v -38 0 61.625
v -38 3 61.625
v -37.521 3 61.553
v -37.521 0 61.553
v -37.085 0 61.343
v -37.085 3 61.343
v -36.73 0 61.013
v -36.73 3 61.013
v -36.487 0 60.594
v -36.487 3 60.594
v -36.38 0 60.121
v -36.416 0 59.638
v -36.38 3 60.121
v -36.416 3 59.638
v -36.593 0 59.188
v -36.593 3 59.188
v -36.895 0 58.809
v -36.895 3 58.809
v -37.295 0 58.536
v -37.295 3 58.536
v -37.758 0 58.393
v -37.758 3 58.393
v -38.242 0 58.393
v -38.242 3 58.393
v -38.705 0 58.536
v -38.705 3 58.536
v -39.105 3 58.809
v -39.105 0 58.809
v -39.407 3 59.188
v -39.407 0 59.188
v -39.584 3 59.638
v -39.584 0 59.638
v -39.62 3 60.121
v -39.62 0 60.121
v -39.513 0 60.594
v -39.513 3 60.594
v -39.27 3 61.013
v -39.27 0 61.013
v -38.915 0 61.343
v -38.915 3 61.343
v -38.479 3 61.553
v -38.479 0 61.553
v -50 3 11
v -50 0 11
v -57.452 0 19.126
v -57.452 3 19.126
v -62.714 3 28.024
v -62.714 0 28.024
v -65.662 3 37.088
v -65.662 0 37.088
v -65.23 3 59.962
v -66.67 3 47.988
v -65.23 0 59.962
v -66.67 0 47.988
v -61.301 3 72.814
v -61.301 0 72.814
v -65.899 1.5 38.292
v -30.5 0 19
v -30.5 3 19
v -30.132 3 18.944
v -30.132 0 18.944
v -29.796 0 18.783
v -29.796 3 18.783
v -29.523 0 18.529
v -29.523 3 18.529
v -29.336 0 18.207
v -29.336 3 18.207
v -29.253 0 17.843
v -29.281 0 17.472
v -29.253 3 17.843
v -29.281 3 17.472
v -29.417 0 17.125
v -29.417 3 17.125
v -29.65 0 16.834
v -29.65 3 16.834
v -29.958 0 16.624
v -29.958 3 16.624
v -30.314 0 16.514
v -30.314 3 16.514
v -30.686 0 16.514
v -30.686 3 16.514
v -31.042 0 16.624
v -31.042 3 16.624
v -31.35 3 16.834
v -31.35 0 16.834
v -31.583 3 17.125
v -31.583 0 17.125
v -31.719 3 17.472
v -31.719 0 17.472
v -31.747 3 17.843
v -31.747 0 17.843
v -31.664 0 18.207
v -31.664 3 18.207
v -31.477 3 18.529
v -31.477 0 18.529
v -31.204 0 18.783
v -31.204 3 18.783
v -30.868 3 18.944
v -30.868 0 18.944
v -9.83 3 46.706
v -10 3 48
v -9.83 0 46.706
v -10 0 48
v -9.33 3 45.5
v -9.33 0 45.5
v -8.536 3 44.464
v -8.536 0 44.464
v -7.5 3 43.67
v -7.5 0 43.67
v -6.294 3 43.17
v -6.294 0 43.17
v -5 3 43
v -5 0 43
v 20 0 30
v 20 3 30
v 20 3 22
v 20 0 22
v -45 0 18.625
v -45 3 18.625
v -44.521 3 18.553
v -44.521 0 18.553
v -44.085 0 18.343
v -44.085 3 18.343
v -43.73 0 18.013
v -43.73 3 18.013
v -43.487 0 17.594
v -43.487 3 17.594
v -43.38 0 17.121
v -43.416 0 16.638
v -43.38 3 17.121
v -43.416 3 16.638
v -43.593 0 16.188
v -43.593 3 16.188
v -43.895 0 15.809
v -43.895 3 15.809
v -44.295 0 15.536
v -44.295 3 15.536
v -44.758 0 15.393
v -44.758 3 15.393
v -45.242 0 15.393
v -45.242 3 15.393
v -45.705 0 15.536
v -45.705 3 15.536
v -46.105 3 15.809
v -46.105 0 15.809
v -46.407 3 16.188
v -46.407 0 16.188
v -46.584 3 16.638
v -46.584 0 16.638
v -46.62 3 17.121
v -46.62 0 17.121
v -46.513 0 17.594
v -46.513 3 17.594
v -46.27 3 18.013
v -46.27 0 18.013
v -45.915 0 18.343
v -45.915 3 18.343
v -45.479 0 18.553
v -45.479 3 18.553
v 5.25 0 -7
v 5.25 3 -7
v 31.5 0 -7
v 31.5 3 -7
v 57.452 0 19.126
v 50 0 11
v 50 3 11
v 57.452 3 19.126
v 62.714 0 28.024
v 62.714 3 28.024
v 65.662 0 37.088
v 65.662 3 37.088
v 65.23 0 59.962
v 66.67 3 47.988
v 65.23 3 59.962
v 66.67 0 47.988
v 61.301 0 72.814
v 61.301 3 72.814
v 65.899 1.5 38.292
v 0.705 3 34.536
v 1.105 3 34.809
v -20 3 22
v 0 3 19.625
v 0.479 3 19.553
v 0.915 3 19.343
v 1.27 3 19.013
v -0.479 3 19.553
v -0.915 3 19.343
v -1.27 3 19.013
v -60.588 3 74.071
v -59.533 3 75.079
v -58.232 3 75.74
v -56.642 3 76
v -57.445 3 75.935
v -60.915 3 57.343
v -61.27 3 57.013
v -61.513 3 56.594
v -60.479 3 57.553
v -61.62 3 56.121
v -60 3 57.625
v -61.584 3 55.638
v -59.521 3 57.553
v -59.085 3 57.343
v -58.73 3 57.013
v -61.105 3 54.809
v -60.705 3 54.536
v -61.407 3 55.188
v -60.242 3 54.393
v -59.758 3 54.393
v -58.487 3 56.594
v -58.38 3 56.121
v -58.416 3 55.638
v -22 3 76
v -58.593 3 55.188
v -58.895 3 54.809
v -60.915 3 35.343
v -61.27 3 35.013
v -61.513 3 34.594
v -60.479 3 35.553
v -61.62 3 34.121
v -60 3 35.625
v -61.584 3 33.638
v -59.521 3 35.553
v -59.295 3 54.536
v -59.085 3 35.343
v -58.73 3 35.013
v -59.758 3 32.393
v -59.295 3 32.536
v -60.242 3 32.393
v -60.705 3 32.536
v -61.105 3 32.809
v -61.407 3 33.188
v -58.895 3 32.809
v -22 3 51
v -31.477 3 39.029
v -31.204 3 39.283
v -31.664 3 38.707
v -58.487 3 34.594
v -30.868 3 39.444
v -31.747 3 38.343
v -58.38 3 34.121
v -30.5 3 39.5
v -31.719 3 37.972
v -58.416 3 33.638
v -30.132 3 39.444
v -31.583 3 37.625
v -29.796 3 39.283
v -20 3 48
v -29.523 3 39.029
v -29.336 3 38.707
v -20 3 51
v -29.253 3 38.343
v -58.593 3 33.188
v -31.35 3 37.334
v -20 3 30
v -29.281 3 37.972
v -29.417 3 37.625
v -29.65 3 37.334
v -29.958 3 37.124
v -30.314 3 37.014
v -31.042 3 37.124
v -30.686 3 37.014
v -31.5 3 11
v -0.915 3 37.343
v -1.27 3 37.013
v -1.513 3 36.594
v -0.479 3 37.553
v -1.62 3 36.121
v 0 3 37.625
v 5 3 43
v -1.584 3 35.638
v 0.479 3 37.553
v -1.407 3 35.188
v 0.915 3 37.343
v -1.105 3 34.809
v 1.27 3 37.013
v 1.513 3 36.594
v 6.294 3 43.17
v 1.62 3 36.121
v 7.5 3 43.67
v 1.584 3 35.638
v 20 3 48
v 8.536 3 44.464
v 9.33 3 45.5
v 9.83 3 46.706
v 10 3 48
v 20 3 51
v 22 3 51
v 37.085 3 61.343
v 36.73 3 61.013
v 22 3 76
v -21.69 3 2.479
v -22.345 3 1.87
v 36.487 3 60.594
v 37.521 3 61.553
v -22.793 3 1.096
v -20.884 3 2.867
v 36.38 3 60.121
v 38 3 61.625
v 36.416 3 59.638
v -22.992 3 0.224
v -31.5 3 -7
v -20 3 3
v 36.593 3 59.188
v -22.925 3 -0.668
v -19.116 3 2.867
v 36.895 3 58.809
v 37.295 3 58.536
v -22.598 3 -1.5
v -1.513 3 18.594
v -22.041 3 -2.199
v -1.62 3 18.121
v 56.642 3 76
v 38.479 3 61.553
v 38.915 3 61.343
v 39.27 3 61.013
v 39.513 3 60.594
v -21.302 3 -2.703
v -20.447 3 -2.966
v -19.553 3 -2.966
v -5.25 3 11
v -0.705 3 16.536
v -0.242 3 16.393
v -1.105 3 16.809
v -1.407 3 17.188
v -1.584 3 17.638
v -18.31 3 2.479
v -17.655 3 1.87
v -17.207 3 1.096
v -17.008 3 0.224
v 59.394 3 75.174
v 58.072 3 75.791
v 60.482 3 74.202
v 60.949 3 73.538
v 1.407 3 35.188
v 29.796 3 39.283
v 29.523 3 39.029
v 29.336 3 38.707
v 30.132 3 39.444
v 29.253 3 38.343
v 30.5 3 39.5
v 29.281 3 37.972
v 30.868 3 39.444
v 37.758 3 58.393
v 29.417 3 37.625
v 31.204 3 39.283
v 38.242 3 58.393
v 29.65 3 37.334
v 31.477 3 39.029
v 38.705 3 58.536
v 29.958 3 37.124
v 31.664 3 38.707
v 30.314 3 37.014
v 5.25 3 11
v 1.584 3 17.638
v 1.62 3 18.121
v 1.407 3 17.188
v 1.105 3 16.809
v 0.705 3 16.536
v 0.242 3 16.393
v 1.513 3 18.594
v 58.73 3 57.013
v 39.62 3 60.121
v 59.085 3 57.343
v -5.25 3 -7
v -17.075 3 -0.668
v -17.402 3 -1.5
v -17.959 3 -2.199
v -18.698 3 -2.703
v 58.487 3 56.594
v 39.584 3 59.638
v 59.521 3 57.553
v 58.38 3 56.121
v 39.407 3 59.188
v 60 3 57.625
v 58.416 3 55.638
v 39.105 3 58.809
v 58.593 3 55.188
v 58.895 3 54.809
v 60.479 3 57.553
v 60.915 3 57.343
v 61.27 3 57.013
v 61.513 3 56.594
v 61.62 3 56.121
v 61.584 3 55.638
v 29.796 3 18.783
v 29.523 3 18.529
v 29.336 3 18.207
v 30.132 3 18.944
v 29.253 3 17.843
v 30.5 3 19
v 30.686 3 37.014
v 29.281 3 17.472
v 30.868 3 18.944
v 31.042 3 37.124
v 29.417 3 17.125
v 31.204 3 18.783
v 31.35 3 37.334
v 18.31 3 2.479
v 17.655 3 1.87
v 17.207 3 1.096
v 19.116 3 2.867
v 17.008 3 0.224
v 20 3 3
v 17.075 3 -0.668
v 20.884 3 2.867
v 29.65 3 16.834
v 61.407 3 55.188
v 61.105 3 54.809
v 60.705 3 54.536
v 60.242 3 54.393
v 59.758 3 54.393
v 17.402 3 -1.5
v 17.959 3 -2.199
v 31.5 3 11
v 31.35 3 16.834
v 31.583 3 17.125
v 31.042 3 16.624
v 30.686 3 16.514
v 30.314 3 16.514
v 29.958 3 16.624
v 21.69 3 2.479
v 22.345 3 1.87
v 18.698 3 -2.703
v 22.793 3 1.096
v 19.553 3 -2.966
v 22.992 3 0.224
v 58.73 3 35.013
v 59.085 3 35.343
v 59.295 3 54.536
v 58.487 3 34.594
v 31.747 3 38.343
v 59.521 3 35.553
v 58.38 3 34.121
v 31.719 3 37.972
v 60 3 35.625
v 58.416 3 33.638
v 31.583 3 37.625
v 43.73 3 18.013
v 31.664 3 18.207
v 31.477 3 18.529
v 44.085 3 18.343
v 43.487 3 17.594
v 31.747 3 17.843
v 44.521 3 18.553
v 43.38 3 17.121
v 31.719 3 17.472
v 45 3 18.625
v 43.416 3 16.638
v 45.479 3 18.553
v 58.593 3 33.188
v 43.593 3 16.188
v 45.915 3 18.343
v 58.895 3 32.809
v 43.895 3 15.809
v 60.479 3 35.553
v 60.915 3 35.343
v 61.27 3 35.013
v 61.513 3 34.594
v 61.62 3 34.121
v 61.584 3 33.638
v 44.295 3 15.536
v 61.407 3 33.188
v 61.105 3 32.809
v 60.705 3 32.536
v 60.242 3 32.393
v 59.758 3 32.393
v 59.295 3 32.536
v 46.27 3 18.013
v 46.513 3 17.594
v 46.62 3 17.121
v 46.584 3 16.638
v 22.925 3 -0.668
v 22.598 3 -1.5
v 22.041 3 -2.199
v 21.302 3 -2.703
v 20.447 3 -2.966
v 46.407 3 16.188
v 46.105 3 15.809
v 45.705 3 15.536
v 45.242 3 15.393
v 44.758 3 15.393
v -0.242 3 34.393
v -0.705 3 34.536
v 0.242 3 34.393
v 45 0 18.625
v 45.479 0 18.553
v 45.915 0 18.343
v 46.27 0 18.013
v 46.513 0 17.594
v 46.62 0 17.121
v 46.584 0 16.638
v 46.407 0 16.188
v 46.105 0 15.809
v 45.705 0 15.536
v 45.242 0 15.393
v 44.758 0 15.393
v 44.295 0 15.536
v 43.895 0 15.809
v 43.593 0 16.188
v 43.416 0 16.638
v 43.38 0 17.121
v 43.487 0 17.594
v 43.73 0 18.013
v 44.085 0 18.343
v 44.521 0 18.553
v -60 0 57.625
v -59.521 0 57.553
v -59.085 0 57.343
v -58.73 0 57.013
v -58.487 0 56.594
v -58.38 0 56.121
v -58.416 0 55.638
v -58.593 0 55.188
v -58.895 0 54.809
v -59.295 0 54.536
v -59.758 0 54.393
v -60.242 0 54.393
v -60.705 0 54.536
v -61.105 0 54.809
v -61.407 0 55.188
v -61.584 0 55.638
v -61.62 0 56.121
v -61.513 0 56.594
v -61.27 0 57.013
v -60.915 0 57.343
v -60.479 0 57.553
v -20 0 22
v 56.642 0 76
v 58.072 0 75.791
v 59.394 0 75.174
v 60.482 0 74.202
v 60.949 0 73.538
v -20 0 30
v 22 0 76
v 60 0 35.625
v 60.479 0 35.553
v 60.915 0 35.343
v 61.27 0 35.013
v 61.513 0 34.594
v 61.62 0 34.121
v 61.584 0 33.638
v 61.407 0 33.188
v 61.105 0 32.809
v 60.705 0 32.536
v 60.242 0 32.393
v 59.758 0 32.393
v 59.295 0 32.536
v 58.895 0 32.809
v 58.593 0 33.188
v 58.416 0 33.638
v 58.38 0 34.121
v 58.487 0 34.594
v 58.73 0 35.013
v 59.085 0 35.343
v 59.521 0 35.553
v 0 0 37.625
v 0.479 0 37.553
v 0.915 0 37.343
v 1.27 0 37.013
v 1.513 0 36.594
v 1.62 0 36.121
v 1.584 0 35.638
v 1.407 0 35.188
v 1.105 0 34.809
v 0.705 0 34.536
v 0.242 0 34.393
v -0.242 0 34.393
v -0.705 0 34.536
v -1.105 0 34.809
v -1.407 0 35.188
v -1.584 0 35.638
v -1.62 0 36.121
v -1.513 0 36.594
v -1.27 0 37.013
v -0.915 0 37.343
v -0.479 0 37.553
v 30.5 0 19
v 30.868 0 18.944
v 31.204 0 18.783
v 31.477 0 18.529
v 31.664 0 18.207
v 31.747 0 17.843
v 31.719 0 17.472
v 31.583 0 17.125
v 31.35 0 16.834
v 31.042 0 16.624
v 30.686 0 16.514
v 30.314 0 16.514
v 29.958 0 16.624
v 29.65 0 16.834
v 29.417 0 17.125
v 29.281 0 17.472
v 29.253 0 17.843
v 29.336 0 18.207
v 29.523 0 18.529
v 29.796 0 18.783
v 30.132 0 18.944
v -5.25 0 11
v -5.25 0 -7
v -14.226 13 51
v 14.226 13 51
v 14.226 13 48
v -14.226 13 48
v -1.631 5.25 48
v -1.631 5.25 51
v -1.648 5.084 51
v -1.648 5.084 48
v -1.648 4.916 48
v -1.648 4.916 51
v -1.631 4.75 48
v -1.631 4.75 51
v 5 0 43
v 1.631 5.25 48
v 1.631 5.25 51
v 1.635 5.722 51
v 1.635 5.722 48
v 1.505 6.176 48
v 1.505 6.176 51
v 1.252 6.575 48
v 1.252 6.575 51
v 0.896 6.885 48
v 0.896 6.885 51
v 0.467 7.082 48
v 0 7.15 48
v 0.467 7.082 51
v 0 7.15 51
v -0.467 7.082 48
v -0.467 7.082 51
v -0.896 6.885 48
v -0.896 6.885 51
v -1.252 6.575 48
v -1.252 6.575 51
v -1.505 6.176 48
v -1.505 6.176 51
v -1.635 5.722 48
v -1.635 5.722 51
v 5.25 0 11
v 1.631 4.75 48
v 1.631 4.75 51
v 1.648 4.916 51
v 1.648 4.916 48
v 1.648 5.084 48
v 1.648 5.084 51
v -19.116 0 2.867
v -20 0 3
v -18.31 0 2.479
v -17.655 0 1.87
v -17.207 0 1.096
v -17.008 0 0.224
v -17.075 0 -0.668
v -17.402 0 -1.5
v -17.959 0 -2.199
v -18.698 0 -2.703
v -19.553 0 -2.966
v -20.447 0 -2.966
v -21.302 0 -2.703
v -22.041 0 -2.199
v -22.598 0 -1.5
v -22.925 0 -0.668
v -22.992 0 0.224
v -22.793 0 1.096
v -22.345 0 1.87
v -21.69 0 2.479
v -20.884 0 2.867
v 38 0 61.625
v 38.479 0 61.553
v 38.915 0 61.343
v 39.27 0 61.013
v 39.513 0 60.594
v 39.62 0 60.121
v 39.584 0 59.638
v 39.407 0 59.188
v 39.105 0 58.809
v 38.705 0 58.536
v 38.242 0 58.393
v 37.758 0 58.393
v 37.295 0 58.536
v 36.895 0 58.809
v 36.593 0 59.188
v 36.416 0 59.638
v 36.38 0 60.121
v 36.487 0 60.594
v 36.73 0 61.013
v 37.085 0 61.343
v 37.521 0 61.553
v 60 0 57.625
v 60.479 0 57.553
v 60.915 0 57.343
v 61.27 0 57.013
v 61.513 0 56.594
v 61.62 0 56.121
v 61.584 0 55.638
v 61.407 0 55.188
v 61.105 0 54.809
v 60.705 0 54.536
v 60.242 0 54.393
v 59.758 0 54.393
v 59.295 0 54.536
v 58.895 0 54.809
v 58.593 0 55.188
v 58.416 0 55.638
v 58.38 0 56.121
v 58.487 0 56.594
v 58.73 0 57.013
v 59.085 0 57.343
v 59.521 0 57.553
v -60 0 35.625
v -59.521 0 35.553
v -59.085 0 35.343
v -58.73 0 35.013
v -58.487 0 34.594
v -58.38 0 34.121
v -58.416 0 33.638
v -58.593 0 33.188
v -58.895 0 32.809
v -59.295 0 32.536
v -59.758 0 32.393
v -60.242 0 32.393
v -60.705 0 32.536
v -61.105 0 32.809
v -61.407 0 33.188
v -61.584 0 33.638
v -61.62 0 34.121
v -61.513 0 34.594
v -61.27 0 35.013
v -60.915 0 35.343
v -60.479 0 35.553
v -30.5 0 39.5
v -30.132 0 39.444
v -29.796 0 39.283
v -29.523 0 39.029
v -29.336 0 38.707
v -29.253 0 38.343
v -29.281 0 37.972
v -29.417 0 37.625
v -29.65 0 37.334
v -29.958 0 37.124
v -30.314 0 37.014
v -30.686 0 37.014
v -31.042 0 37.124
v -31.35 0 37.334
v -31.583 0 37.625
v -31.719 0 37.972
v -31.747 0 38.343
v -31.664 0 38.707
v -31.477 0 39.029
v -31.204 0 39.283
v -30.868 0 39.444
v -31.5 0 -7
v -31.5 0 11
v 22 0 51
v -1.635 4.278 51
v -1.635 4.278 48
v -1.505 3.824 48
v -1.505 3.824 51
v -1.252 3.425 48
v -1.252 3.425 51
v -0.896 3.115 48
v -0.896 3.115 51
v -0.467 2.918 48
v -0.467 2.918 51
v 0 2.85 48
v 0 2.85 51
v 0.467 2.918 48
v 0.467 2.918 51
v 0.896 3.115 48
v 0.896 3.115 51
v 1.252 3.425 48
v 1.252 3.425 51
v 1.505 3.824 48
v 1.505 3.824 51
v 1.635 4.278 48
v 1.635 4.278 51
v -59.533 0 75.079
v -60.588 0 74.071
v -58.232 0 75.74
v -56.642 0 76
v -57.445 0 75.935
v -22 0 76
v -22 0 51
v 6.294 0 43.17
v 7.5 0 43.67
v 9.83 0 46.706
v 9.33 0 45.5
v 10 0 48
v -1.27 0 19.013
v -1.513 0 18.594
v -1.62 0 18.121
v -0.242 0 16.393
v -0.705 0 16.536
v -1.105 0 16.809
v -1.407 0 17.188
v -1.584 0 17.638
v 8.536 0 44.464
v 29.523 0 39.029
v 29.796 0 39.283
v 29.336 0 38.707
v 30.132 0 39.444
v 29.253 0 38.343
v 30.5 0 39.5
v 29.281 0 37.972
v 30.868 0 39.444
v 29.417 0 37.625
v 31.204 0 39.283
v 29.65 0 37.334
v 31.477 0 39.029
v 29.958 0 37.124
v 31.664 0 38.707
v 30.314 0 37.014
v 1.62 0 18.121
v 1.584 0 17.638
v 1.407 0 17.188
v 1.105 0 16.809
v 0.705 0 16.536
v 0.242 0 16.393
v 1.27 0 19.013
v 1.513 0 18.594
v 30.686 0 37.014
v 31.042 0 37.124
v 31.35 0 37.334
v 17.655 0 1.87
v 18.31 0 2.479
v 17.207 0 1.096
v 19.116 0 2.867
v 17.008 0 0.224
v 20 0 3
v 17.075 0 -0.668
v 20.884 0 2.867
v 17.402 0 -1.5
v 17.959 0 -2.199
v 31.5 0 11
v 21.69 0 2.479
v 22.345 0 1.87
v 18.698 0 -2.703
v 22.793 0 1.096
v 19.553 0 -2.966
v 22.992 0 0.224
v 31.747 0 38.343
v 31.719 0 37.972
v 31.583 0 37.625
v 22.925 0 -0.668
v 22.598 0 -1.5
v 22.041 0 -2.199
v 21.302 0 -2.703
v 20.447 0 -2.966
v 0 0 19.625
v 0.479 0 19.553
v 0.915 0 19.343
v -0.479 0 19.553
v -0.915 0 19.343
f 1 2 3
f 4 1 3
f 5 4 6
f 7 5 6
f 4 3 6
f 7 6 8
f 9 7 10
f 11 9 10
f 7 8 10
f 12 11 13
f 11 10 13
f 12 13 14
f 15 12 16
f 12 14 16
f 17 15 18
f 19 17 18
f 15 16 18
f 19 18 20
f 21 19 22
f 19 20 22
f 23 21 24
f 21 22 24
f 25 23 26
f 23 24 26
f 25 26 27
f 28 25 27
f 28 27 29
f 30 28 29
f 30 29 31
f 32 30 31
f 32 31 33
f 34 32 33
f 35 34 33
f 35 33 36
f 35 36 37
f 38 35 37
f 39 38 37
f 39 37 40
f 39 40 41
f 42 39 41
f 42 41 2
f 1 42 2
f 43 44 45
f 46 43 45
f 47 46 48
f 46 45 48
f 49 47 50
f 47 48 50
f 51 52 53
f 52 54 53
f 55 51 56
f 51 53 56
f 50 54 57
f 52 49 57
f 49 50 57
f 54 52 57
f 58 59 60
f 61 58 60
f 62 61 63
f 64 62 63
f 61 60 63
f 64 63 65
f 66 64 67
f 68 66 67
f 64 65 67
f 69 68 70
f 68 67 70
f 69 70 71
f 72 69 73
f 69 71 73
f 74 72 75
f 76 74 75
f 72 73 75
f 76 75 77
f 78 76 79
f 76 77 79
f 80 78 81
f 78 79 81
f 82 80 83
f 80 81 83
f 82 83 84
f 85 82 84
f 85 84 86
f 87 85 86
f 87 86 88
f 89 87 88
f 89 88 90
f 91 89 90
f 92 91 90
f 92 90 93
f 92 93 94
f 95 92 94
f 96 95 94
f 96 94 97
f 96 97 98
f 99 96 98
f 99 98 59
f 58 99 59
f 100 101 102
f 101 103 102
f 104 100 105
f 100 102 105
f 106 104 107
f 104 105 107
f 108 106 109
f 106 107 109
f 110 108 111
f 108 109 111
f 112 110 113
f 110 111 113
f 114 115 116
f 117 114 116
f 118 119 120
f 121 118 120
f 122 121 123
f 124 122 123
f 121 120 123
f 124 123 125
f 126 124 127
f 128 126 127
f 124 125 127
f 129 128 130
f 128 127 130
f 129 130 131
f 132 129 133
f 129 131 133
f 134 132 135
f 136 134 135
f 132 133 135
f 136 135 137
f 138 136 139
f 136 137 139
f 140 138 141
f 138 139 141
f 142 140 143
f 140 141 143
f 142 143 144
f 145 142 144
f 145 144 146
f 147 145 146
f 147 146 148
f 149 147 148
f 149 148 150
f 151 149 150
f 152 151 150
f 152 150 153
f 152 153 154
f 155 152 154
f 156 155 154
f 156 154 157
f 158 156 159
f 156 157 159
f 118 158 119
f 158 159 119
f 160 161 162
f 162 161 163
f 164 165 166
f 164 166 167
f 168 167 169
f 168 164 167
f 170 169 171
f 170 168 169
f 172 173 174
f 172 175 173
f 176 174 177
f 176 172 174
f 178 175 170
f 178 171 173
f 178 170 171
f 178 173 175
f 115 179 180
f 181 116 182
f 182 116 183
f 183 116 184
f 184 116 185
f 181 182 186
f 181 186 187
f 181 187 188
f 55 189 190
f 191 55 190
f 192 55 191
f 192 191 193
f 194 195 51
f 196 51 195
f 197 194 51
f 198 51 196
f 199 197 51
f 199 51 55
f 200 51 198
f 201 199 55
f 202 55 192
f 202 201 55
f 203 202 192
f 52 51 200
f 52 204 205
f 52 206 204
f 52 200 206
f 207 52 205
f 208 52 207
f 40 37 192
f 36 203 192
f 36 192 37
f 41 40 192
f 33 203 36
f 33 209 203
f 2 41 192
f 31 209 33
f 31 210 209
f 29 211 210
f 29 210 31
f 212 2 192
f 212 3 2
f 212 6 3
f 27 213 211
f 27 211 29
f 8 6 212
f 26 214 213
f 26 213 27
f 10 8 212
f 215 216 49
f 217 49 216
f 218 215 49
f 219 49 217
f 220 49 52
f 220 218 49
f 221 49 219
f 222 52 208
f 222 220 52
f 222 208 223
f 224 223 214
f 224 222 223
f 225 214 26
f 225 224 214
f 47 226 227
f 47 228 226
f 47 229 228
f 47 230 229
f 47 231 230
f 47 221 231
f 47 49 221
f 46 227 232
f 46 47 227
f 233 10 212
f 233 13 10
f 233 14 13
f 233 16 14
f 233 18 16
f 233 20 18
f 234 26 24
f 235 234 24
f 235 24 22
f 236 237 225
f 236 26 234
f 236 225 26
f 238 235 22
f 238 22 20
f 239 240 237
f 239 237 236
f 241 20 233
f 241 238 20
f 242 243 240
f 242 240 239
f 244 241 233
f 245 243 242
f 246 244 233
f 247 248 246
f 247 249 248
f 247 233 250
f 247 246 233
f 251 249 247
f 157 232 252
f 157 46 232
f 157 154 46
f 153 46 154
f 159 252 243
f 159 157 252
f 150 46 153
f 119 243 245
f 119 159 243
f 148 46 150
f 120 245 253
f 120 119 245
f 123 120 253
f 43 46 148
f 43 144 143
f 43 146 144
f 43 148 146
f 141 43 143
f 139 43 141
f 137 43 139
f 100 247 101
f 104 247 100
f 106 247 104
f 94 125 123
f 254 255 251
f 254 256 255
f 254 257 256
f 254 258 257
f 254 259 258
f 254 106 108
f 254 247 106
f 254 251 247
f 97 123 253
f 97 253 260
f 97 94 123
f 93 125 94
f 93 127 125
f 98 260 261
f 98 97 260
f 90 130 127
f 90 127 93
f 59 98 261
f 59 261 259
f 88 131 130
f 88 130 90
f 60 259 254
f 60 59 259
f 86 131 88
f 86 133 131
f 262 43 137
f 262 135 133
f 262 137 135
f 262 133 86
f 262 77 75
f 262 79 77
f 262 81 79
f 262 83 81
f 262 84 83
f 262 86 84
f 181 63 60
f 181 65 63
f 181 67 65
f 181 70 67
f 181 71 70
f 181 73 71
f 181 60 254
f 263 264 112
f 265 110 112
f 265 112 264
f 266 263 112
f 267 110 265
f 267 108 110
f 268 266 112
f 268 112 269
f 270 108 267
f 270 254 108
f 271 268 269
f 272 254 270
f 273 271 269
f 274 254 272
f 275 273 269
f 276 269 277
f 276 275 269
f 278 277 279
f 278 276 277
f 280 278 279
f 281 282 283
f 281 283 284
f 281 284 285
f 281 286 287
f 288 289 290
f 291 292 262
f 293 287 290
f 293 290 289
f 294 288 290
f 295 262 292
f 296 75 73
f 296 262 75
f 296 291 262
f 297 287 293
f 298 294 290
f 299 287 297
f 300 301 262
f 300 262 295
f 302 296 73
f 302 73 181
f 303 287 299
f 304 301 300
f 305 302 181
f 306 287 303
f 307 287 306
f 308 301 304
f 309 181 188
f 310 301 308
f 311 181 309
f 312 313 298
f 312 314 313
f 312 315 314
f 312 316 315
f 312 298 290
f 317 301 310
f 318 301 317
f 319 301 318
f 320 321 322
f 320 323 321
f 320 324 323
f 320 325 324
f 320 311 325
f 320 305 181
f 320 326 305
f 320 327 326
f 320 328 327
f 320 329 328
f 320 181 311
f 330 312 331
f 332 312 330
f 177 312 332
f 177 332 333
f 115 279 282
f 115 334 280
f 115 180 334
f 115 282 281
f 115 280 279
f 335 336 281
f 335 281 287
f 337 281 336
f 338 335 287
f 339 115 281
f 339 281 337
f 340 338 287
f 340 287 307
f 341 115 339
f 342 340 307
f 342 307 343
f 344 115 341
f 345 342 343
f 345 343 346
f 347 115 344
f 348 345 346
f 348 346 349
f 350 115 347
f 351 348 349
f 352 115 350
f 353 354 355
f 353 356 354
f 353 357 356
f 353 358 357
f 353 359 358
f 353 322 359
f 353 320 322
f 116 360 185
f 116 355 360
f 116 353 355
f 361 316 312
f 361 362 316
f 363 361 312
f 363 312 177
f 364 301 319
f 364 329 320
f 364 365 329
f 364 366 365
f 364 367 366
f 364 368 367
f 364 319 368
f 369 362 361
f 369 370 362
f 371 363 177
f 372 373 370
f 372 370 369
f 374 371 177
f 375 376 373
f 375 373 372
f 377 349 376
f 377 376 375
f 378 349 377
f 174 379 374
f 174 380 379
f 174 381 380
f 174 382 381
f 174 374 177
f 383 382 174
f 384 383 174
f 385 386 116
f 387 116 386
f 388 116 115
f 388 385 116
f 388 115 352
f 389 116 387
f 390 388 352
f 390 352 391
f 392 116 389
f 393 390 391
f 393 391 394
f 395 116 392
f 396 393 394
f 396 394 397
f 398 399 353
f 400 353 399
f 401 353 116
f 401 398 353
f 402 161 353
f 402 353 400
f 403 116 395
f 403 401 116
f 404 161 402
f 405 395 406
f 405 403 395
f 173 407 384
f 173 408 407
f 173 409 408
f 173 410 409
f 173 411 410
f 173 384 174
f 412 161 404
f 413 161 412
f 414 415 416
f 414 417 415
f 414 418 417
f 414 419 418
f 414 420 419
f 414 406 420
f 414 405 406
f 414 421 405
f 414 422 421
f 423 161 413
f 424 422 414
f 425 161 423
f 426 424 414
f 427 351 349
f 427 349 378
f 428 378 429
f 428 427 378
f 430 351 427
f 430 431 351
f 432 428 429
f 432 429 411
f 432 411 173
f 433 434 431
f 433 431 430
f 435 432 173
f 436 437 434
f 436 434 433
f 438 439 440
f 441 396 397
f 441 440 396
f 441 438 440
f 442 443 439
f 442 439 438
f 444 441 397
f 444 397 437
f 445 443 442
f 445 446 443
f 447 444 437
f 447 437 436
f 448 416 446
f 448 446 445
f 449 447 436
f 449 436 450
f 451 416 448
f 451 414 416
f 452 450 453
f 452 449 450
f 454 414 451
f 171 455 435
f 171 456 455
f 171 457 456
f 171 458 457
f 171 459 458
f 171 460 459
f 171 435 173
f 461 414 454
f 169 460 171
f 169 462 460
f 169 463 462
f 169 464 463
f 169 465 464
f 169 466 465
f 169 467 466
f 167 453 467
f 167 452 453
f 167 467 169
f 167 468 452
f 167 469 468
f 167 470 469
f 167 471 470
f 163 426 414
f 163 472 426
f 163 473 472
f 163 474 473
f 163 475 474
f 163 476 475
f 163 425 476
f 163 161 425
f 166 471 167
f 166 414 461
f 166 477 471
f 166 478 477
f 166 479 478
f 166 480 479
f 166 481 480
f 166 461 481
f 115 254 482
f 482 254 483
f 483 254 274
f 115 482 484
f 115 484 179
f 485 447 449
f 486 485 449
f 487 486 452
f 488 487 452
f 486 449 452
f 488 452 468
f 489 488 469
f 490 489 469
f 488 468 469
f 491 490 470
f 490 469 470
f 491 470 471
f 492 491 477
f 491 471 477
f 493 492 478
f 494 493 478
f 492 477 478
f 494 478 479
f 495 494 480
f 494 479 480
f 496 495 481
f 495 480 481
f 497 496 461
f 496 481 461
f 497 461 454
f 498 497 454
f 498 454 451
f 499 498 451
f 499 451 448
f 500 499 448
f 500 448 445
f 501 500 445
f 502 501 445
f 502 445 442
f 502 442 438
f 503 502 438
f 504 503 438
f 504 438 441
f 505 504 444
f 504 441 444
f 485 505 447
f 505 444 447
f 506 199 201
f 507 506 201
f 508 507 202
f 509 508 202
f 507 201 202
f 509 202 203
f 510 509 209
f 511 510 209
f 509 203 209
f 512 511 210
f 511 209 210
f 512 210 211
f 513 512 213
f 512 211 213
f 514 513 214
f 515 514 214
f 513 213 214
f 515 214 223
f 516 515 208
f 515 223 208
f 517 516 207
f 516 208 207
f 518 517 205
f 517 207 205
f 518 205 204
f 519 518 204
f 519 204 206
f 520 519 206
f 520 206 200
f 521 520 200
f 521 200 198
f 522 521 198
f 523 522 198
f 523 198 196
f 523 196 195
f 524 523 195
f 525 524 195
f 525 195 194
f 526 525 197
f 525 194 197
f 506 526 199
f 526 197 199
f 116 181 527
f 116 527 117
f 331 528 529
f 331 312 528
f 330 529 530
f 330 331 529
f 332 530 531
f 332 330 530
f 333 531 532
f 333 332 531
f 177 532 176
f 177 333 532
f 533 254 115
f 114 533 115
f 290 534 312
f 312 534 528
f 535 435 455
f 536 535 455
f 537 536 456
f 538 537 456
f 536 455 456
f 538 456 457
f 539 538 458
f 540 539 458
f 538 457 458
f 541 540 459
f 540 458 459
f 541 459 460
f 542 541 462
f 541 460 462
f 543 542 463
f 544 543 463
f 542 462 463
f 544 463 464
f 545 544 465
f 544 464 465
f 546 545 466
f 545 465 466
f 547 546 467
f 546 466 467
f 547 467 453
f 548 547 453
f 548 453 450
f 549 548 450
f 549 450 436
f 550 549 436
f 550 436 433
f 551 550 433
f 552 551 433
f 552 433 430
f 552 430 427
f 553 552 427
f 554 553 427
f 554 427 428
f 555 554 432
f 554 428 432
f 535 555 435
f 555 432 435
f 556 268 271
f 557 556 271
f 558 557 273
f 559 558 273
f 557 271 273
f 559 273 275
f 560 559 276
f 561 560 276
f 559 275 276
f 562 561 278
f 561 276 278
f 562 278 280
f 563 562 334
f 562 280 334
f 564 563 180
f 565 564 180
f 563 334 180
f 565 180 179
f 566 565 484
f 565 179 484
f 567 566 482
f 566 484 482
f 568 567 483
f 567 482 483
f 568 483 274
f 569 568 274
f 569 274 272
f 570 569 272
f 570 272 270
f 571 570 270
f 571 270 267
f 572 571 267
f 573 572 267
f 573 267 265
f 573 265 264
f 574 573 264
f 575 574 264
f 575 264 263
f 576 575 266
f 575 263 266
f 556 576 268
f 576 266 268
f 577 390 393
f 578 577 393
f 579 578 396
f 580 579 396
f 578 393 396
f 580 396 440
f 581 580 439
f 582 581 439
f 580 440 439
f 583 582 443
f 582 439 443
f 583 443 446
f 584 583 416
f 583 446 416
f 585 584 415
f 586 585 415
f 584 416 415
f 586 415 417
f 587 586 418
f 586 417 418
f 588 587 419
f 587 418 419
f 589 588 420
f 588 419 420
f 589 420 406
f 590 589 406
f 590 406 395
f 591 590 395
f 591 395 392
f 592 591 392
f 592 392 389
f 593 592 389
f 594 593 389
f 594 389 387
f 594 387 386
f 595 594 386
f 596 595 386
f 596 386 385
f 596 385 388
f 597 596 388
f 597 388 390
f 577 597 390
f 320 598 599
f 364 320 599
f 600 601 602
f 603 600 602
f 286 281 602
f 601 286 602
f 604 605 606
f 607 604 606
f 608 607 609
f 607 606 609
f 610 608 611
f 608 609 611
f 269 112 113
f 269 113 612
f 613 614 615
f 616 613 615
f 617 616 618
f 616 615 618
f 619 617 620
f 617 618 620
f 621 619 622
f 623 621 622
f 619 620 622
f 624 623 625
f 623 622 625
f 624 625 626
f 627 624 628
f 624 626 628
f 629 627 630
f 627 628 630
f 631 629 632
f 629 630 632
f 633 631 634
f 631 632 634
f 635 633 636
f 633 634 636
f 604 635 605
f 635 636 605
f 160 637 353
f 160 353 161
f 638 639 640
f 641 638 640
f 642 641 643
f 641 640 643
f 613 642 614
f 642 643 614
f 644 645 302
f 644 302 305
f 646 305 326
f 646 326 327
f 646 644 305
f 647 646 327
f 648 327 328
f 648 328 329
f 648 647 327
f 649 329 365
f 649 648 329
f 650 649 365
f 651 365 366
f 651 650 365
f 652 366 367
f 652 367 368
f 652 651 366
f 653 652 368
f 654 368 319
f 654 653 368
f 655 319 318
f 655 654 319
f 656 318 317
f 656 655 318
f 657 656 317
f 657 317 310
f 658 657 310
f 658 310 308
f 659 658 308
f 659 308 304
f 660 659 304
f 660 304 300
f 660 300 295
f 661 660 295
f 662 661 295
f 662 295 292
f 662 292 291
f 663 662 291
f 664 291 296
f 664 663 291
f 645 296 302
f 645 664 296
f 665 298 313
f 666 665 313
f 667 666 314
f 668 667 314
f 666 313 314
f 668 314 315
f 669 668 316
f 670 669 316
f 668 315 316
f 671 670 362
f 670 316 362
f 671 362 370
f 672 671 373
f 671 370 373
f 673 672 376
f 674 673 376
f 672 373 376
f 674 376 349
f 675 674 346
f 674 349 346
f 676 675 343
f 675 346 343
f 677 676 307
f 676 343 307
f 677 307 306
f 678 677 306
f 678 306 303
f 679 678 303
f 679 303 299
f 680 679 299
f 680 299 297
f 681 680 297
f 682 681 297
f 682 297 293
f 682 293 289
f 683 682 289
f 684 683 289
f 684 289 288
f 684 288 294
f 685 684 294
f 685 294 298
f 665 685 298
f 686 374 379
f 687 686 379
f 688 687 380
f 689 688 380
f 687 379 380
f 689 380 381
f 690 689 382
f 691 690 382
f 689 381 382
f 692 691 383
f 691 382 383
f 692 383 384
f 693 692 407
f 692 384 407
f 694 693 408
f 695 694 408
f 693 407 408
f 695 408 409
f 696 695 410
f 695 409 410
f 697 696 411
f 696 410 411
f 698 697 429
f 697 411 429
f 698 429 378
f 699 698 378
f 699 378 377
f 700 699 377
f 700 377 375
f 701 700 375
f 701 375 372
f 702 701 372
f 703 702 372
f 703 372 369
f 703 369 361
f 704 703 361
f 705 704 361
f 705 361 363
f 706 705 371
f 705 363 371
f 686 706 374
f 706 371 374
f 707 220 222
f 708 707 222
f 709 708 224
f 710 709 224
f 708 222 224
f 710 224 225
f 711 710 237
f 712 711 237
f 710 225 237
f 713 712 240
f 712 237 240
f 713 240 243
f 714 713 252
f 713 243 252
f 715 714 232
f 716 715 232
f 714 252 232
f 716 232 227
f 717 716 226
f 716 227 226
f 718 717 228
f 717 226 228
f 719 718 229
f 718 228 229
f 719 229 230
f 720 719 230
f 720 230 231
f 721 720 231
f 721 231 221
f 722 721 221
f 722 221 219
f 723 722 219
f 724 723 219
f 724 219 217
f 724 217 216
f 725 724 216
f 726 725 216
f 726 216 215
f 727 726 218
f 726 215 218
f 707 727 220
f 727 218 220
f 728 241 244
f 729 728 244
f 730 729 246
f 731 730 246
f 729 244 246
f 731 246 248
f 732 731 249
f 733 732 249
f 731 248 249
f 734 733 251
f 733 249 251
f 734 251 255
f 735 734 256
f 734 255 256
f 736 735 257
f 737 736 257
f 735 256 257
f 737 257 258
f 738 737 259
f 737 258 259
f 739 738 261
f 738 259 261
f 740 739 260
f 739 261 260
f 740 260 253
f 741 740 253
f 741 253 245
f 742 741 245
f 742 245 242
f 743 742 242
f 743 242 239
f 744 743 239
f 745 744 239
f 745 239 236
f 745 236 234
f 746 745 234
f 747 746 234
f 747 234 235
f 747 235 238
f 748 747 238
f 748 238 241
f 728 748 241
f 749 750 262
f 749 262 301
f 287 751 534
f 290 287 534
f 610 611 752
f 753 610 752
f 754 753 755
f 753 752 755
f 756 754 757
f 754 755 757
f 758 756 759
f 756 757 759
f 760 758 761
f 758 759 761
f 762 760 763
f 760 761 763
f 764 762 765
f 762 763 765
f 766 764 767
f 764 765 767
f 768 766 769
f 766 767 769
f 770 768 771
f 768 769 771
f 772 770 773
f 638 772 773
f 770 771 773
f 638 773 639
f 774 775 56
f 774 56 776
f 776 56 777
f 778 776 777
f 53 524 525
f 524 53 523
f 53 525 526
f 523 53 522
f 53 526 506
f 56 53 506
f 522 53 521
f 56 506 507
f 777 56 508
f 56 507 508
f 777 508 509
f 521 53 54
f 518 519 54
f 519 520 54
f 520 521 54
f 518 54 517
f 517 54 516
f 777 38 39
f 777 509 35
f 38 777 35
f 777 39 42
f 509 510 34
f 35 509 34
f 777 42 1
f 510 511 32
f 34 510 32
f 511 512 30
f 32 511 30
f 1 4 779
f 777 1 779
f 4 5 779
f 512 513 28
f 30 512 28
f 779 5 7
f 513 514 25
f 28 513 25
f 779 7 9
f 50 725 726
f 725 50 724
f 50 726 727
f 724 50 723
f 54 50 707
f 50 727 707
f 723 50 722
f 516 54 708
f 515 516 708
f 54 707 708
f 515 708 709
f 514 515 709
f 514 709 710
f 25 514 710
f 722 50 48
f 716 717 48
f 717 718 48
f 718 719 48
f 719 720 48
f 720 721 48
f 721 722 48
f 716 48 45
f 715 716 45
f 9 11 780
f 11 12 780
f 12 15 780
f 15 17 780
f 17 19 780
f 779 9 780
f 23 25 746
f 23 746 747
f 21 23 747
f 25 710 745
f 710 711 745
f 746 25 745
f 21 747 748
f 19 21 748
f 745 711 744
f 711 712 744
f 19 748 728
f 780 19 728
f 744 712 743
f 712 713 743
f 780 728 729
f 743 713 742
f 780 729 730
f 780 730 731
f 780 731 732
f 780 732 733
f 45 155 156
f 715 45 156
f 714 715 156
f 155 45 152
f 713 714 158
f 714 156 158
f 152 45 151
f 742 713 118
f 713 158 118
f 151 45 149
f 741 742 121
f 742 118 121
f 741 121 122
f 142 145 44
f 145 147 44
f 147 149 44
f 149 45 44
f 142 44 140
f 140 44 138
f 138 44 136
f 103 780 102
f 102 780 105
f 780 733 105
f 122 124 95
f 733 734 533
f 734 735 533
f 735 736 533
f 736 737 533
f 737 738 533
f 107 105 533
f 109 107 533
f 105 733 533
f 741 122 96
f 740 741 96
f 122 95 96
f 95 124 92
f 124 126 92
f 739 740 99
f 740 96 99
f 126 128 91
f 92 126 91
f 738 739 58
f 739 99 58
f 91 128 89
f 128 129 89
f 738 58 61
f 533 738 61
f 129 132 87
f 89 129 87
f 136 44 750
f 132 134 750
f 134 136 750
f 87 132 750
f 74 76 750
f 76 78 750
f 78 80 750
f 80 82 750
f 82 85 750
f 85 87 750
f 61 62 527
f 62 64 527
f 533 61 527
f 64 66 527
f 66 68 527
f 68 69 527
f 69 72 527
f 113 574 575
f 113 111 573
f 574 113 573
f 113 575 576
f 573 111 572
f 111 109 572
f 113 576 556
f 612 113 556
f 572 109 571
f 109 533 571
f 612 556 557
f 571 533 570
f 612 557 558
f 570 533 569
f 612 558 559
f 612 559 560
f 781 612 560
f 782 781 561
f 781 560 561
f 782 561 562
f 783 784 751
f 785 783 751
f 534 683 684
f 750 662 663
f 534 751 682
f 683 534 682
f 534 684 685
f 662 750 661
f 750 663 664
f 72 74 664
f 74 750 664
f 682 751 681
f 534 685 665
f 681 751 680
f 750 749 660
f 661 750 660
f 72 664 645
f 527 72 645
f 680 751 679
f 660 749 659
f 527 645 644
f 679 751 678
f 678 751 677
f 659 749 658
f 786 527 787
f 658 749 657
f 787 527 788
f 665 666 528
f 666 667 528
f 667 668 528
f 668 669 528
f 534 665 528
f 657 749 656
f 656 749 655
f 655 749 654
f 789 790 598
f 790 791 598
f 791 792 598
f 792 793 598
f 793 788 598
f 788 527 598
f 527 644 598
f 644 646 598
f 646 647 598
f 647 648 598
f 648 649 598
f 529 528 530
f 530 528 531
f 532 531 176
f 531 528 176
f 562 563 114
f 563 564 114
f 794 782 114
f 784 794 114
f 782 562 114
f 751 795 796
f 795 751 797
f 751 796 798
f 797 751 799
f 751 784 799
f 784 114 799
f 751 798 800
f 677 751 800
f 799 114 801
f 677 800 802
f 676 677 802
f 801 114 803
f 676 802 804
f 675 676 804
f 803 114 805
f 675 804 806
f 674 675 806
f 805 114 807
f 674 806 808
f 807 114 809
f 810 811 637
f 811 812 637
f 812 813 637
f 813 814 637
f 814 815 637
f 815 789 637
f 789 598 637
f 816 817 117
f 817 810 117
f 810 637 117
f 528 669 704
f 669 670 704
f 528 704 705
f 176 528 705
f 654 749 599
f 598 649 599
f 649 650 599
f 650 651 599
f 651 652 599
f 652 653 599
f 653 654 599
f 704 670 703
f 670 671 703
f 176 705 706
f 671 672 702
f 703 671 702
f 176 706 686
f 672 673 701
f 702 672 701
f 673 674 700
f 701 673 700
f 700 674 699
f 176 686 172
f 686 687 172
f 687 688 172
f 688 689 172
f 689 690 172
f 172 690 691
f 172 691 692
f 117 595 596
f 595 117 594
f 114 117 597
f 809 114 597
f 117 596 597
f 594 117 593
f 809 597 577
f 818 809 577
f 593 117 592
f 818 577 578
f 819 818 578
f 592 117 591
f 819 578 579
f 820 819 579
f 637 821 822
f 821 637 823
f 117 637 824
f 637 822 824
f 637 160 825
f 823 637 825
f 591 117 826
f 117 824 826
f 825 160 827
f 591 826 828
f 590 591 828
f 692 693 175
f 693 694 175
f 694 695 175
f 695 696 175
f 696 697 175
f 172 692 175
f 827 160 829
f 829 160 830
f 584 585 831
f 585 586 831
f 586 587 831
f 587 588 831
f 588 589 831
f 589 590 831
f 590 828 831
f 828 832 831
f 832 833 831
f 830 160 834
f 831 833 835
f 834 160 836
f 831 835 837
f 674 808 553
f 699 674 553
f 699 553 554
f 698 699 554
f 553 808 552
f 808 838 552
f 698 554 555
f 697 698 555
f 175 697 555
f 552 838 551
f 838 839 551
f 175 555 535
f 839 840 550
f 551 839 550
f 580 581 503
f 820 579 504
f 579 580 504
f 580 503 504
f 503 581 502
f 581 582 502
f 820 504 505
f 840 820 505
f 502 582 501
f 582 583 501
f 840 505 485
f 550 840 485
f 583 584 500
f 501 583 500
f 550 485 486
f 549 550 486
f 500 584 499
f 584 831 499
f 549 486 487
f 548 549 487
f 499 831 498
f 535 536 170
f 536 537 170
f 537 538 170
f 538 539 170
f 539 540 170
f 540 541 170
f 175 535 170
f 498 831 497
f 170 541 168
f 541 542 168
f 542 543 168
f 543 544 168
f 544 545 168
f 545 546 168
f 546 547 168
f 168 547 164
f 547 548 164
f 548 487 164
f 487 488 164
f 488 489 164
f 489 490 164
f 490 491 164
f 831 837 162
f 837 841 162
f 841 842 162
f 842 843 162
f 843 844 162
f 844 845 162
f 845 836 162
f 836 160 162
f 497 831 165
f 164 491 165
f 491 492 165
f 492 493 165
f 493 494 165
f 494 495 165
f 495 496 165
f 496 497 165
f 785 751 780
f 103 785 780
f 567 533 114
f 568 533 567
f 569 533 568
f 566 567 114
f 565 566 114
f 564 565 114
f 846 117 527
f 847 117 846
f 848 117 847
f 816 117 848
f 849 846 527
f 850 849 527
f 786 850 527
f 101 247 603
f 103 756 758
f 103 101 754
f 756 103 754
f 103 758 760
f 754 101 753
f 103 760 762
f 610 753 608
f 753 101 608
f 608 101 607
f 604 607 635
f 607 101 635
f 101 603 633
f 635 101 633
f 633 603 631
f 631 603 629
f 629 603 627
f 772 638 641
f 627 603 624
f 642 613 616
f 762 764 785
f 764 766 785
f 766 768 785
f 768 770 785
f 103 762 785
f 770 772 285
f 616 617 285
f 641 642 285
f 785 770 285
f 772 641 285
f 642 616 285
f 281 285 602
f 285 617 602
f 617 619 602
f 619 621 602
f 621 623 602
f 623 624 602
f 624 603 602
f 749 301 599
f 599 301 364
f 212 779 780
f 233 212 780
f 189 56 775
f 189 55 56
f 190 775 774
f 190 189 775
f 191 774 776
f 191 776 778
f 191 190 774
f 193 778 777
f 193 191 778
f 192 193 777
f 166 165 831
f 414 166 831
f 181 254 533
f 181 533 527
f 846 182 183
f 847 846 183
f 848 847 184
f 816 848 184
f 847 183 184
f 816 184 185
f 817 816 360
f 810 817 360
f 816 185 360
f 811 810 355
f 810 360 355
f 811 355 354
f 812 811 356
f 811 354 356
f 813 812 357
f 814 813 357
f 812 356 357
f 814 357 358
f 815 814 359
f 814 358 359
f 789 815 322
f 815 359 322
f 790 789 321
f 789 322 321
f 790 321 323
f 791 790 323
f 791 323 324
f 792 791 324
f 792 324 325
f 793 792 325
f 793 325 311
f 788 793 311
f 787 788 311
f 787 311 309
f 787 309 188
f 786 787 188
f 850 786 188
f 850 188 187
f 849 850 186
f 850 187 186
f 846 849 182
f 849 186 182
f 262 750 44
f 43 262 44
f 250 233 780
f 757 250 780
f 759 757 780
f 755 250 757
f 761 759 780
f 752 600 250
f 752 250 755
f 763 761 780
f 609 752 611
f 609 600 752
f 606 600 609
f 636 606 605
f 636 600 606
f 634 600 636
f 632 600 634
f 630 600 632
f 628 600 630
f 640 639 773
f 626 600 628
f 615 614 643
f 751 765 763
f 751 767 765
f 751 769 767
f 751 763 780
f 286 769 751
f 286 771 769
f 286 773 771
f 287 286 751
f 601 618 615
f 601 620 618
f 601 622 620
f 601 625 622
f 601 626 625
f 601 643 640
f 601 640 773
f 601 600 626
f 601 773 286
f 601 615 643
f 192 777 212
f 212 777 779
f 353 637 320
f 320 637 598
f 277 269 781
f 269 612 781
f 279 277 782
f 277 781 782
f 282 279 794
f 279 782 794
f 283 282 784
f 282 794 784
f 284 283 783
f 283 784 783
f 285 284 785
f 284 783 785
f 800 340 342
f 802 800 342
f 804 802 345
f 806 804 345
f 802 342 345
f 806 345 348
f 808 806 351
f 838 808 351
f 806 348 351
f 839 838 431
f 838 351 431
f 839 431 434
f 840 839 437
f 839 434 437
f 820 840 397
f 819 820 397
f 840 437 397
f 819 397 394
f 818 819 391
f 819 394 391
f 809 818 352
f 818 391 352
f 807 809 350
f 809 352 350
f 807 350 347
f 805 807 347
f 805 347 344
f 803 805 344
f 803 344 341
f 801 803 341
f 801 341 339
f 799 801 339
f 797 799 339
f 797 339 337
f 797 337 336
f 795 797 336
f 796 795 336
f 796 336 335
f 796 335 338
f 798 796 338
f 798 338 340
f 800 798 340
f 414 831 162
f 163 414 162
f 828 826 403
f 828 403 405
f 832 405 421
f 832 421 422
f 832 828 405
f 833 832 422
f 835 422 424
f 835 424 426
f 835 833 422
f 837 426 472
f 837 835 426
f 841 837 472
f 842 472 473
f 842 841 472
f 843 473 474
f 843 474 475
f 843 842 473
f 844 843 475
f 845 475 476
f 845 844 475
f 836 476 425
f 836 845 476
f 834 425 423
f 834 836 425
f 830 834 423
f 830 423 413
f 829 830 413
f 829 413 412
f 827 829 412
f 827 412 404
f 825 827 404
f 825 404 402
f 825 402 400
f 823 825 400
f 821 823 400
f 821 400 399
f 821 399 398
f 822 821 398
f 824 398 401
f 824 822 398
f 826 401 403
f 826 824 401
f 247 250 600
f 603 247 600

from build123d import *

# Parameters (mm, degrees)
SKETCH1_W           = 26.25
SKETCH1_H           = 22
SKETCH1_R           = 3
BOSS_EXTRUDE1_DEPTH = 3
FILLET1_R           = 5
SKETCH2_R           = 1.625
CUT_EXTRUDE1_DEPTH  = 3
SKETCH5_W           = 20
SKETCH5_H           = 3
BOSS_EXTRUDE2_DEPTH = 10
SKETCH6_R           = 1.65
CUT_EXTRUDE4_DEPTH  = 28
CHAMFER1_SIZE       = 10
CHAMFER1_SIZE_2     = 17.320508076
SKETCH9_W           = 20
SKETCH9_H           = 5
CUT_EXTRUDE6_DEPTH  = 3
FILLET3_R           = 5
SKETCH16_W          = 40
SKETCH16_H          = 8
CUT_EXTRUDE11_DEPTH = 10
SKETCH17_R          = 1.25
CUT_EXTRUDE12_DEPTH = 10
SKETCH18_W          = 114.543980026
SKETCH18_H          = 4
CUT_EXTRUDE13_DEPTH = 10
SKETCH3_R           = 1.625
CUT_EXTRUDE14_DEPTH = 10


# Some blends are built 0.0001 mm under size
with BuildPart() as part:
    # Sketch1 → Boss-Extrude1 (new body)
    # profile 1 of 3: a face of its own
    with BuildSketch(Plane(origin=(0, 0, 0), x_dir=(1, 0, 0), z_dir=(0, 1, 0))):
        with Locations((18.375, 0)):
            Rectangle(SKETCH1_W, SKETCH1_H)
        with Locations(Location((20, 0, 0), (0, 0, 270))):
            Circle(SKETCH1_R, mode=Mode.SUBTRACT)
    # profile 2 of 3: a face of its own
    with BuildSketch(Plane(origin=(0, 0, 0), x_dir=(1, 0, 0), z_dir=(0, 1, 0))):
        with Locations((-18.375, 0)):
            Rectangle(SKETCH1_W, SKETCH1_H)
        with Locations(Location((-20, 0, 0), (0, 0, 270))):
            Circle(SKETCH1_R, mode=Mode.SUBTRACT)
    # profile 3 of 3: a face of its own
    with BuildSketch(Plane(origin=(0, 0, 0), x_dir=(1, 0, 0), z_dir=(0, 1, 0))):
        with BuildLine():
            Line((-5.25, -11), (-31.5, -11))
            Line((-31.5, -11), (-50, -11))
            add(Edge.make_bspline(
                [(-50, -11), (-77.2307176, -35.658609428), (-60, -76)],
                knots=[0, 0, 0, 1, 1, 1], degree=2))
            Line((-60, -76), (-22, -76))
            Line((-22, -76), (-22, -51))
            Line((-22, -51), (22, -51))
            Line((22, -51), (22, -76))
            Line((22, -76), (60, -76))
            add(Edge.make_bspline(
                [(50, -11), (77.2307176, -35.658609428), (60, -76)],
                knots=[0, 0, 0, 1, 1, 1], degree=2))
            Line((50, -11), (31.5, -11))
            Line((31.5, -11), (5.25, -11))
            Line((5.25, -11), (-5.25, -11))
        make_face()
    extrude(amount=BOSS_EXTRUDE1_DEPTH)

    # Fillet1
    fillet1_edges = [part.edges().sort_by_distance(p)[0] for p in [
        (60, 1.5, 76),
        (-60, 1.5, 76),
    ]]
    fillet(fillet1_edges, radius=FILLET1_R)

    # Sketch2 → Cut-Extrude1 (cut)
    with BuildSketch(Plane(origin=(0, 3, 0), x_dir=(1, 0, 0), z_dir=(0, 1, 0))):
        with Locations(Location((-60, -56, 0), (0, 0, 270))):
            Circle(SKETCH2_R)
        with Locations(Location((60, -56, 0), (0, 0, 270))):
            Circle(SKETCH2_R)
        with Locations(Location((-45, -17, 0), (0, 0, 270))):
            Circle(SKETCH2_R)
        with Locations(Location((-60, -34, 0), (0, 0, 270))):
            Circle(SKETCH2_R)
        with Locations(Location((60, -34, 0), (0, 0, 270))):
            Circle(SKETCH2_R)
        with Locations(Location((45, -17, 0), (0, 0, 270))):
            Circle(SKETCH2_R)
        with Locations(Location((0, -18, 0), (0, 0, 270))):
            Circle(SKETCH2_R)
        with Locations(Location((0, -36, 0), (0, 0, 270))):
            Circle(SKETCH2_R)
    extrude(amount=-CUT_EXTRUDE1_DEPTH, mode=Mode.SUBTRACT)

    # Sketch5 → Boss-Extrude2 (add)
    with BuildSketch(Plane(origin=(0, 3, 0), x_dir=(1, 0, 0), z_dir=(0, 1, 0))):
        with Locations((0, -49.5)):
            Rectangle(SKETCH5_W, SKETCH5_H)
    extrude(amount=BOSS_EXTRUDE2_DEPTH)

    # Sketch6 → Cut-Extrude4 (cut)
    with BuildSketch(Plane.XY.offset(76)):
        with Locations((0, 5)):
            Circle(SKETCH6_R)
        with Locations((0, 5.5)):
            Circle(SKETCH6_R)
        with Locations((0, 4.5)):
            Circle(SKETCH6_R)
    extrude(amount=-CUT_EXTRUDE4_DEPTH, mode=Mode.SUBTRACT)

    # Chamfer1
    # the kernel refuses this chamfer: 17.320508076, 10 mm, written as the material it adds along each edge
    with BuildSketch(Plane(origin=(-10, 3, 51), x_dir=(-0.9983227437537926, -0.05789386240267139, 0), z_dir=(0, 0, -1))) as chamfer1_piece_1_section:
        Polygon((CHAMFER1_SIZE * 0.998322743754, CHAMFER1_SIZE * 0.0578938624027), (-CHAMFER1_SIZE_2 * 0.0578938624016, CHAMFER1_SIZE_2 * 0.998322743736), (0, 0), align=None)
    chamfer1_piece_1 = extrude(amount=3, mode=Mode.PRIVATE)
    chamfer1_piece_1 = split(chamfer1_piece_1, bisect_by=Plane(origin=(-13.731694811, 13, 49.5), z_dir=(0, -1, 0)), keep=Keep.TOP, mode=Mode.PRIVATE)
    add(chamfer1_piece_1)
    with BuildSketch(Plane(origin=(10, 3, 48), x_dir=(0.9983227437537926, -0.05789386240267137, 0), z_dir=(0, 0, 1))) as chamfer1_piece_2_section:
        Polygon((CHAMFER1_SIZE * 0.998322743754, CHAMFER1_SIZE * 0.0578938624027), (-CHAMFER1_SIZE_2 * 0.0578938624016, CHAMFER1_SIZE_2 * 0.998322743736), (0, 0), align=None)
    chamfer1_piece_2 = extrude(amount=3, mode=Mode.PRIVATE)
    chamfer1_piece_2 = split(chamfer1_piece_2, bisect_by=Plane(origin=(13.731694811, 13, 49.5), z_dir=(0, -1, 0)), keep=Keep.TOP, mode=Mode.PRIVATE)
    add(chamfer1_piece_2)

    # Sketch9 → Cut-Extrude6 (cut)
    with BuildSketch(Plane(origin=(0, 3, 0), x_dir=(1, 0, 0), z_dir=(0, 1, 0))):
        with Locations((0, -45.5)):
            Rectangle(SKETCH9_W, SKETCH9_H)
    extrude(amount=-CUT_EXTRUDE6_DEPTH, mode=Mode.SUBTRACT)

    # Fillet3
    fillet3_edges = [part.edges().sort_by_distance(p)[0] for p in [
        (-10, 1.5, 43),
        (10, 1.5, 43),
    ]]
    fillet(fillet3_edges, radius=FILLET3_R - 0.0001)  # a hair under: the kernel refuses the full size

    # Sketch16 → Cut-Extrude11 (cut)
    with BuildSketch(Plane(origin=(0, 3, 0), x_dir=(1, 0, 0), z_dir=(0, 1, 0))):
        with Locations((0, -26)):
            Rectangle(SKETCH16_W, SKETCH16_H)
    extrude(amount=-CUT_EXTRUDE11_DEPTH, mode=Mode.SUBTRACT)

    # Sketch17 → Cut-Extrude12 (cut)
    with BuildSketch(Plane(origin=(0, 3, 0), x_dir=(1, 0, 0), z_dir=(0, 1, 0))):
        with Locations(Location((-30.5, -17.75, 0), (0, 0, 270))):
            Circle(SKETCH17_R)
        with Locations(Location((-30.5, -38.25, 0), (0, 0, 270))):
            Circle(SKETCH17_R)
        with Locations(Location((30.5, -38.25, 0), (0, 0, 270))):
            Circle(SKETCH17_R)
        with Locations(Location((30.5, -17.75, 0), (0, 0, 270))):
            Circle(SKETCH17_R)
    extrude(amount=-CUT_EXTRUDE12_DEPTH, mode=Mode.SUBTRACT)

    # Sketch18 → Cut-Extrude13 (cut)
    with BuildSketch(Plane(origin=(0, 3, 0), x_dir=(1, 0, 0), z_dir=(0, 1, 0))):
        with Locations((-4.144236525, 9)):
            Rectangle(SKETCH18_W, SKETCH18_H)
    extrude(amount=-CUT_EXTRUDE13_DEPTH, mode=Mode.SUBTRACT)

    # Sketch3 → Cut-Extrude14 (cut)
    with BuildSketch(Plane(origin=(0, 3, 0), x_dir=(1, 0, 0), z_dir=(0, 1, 0))):
        with Locations(Location((-38, -60, 0), (0, 0, 270))):
            Circle(SKETCH3_R)
        with Locations(Location((38, -60, 0), (0, 0, 270))):
            Circle(SKETCH3_R)
    extrude(amount=-CUT_EXTRUDE14_DEPTH, mode=Mode.SUBTRACT)


solid = part.part
